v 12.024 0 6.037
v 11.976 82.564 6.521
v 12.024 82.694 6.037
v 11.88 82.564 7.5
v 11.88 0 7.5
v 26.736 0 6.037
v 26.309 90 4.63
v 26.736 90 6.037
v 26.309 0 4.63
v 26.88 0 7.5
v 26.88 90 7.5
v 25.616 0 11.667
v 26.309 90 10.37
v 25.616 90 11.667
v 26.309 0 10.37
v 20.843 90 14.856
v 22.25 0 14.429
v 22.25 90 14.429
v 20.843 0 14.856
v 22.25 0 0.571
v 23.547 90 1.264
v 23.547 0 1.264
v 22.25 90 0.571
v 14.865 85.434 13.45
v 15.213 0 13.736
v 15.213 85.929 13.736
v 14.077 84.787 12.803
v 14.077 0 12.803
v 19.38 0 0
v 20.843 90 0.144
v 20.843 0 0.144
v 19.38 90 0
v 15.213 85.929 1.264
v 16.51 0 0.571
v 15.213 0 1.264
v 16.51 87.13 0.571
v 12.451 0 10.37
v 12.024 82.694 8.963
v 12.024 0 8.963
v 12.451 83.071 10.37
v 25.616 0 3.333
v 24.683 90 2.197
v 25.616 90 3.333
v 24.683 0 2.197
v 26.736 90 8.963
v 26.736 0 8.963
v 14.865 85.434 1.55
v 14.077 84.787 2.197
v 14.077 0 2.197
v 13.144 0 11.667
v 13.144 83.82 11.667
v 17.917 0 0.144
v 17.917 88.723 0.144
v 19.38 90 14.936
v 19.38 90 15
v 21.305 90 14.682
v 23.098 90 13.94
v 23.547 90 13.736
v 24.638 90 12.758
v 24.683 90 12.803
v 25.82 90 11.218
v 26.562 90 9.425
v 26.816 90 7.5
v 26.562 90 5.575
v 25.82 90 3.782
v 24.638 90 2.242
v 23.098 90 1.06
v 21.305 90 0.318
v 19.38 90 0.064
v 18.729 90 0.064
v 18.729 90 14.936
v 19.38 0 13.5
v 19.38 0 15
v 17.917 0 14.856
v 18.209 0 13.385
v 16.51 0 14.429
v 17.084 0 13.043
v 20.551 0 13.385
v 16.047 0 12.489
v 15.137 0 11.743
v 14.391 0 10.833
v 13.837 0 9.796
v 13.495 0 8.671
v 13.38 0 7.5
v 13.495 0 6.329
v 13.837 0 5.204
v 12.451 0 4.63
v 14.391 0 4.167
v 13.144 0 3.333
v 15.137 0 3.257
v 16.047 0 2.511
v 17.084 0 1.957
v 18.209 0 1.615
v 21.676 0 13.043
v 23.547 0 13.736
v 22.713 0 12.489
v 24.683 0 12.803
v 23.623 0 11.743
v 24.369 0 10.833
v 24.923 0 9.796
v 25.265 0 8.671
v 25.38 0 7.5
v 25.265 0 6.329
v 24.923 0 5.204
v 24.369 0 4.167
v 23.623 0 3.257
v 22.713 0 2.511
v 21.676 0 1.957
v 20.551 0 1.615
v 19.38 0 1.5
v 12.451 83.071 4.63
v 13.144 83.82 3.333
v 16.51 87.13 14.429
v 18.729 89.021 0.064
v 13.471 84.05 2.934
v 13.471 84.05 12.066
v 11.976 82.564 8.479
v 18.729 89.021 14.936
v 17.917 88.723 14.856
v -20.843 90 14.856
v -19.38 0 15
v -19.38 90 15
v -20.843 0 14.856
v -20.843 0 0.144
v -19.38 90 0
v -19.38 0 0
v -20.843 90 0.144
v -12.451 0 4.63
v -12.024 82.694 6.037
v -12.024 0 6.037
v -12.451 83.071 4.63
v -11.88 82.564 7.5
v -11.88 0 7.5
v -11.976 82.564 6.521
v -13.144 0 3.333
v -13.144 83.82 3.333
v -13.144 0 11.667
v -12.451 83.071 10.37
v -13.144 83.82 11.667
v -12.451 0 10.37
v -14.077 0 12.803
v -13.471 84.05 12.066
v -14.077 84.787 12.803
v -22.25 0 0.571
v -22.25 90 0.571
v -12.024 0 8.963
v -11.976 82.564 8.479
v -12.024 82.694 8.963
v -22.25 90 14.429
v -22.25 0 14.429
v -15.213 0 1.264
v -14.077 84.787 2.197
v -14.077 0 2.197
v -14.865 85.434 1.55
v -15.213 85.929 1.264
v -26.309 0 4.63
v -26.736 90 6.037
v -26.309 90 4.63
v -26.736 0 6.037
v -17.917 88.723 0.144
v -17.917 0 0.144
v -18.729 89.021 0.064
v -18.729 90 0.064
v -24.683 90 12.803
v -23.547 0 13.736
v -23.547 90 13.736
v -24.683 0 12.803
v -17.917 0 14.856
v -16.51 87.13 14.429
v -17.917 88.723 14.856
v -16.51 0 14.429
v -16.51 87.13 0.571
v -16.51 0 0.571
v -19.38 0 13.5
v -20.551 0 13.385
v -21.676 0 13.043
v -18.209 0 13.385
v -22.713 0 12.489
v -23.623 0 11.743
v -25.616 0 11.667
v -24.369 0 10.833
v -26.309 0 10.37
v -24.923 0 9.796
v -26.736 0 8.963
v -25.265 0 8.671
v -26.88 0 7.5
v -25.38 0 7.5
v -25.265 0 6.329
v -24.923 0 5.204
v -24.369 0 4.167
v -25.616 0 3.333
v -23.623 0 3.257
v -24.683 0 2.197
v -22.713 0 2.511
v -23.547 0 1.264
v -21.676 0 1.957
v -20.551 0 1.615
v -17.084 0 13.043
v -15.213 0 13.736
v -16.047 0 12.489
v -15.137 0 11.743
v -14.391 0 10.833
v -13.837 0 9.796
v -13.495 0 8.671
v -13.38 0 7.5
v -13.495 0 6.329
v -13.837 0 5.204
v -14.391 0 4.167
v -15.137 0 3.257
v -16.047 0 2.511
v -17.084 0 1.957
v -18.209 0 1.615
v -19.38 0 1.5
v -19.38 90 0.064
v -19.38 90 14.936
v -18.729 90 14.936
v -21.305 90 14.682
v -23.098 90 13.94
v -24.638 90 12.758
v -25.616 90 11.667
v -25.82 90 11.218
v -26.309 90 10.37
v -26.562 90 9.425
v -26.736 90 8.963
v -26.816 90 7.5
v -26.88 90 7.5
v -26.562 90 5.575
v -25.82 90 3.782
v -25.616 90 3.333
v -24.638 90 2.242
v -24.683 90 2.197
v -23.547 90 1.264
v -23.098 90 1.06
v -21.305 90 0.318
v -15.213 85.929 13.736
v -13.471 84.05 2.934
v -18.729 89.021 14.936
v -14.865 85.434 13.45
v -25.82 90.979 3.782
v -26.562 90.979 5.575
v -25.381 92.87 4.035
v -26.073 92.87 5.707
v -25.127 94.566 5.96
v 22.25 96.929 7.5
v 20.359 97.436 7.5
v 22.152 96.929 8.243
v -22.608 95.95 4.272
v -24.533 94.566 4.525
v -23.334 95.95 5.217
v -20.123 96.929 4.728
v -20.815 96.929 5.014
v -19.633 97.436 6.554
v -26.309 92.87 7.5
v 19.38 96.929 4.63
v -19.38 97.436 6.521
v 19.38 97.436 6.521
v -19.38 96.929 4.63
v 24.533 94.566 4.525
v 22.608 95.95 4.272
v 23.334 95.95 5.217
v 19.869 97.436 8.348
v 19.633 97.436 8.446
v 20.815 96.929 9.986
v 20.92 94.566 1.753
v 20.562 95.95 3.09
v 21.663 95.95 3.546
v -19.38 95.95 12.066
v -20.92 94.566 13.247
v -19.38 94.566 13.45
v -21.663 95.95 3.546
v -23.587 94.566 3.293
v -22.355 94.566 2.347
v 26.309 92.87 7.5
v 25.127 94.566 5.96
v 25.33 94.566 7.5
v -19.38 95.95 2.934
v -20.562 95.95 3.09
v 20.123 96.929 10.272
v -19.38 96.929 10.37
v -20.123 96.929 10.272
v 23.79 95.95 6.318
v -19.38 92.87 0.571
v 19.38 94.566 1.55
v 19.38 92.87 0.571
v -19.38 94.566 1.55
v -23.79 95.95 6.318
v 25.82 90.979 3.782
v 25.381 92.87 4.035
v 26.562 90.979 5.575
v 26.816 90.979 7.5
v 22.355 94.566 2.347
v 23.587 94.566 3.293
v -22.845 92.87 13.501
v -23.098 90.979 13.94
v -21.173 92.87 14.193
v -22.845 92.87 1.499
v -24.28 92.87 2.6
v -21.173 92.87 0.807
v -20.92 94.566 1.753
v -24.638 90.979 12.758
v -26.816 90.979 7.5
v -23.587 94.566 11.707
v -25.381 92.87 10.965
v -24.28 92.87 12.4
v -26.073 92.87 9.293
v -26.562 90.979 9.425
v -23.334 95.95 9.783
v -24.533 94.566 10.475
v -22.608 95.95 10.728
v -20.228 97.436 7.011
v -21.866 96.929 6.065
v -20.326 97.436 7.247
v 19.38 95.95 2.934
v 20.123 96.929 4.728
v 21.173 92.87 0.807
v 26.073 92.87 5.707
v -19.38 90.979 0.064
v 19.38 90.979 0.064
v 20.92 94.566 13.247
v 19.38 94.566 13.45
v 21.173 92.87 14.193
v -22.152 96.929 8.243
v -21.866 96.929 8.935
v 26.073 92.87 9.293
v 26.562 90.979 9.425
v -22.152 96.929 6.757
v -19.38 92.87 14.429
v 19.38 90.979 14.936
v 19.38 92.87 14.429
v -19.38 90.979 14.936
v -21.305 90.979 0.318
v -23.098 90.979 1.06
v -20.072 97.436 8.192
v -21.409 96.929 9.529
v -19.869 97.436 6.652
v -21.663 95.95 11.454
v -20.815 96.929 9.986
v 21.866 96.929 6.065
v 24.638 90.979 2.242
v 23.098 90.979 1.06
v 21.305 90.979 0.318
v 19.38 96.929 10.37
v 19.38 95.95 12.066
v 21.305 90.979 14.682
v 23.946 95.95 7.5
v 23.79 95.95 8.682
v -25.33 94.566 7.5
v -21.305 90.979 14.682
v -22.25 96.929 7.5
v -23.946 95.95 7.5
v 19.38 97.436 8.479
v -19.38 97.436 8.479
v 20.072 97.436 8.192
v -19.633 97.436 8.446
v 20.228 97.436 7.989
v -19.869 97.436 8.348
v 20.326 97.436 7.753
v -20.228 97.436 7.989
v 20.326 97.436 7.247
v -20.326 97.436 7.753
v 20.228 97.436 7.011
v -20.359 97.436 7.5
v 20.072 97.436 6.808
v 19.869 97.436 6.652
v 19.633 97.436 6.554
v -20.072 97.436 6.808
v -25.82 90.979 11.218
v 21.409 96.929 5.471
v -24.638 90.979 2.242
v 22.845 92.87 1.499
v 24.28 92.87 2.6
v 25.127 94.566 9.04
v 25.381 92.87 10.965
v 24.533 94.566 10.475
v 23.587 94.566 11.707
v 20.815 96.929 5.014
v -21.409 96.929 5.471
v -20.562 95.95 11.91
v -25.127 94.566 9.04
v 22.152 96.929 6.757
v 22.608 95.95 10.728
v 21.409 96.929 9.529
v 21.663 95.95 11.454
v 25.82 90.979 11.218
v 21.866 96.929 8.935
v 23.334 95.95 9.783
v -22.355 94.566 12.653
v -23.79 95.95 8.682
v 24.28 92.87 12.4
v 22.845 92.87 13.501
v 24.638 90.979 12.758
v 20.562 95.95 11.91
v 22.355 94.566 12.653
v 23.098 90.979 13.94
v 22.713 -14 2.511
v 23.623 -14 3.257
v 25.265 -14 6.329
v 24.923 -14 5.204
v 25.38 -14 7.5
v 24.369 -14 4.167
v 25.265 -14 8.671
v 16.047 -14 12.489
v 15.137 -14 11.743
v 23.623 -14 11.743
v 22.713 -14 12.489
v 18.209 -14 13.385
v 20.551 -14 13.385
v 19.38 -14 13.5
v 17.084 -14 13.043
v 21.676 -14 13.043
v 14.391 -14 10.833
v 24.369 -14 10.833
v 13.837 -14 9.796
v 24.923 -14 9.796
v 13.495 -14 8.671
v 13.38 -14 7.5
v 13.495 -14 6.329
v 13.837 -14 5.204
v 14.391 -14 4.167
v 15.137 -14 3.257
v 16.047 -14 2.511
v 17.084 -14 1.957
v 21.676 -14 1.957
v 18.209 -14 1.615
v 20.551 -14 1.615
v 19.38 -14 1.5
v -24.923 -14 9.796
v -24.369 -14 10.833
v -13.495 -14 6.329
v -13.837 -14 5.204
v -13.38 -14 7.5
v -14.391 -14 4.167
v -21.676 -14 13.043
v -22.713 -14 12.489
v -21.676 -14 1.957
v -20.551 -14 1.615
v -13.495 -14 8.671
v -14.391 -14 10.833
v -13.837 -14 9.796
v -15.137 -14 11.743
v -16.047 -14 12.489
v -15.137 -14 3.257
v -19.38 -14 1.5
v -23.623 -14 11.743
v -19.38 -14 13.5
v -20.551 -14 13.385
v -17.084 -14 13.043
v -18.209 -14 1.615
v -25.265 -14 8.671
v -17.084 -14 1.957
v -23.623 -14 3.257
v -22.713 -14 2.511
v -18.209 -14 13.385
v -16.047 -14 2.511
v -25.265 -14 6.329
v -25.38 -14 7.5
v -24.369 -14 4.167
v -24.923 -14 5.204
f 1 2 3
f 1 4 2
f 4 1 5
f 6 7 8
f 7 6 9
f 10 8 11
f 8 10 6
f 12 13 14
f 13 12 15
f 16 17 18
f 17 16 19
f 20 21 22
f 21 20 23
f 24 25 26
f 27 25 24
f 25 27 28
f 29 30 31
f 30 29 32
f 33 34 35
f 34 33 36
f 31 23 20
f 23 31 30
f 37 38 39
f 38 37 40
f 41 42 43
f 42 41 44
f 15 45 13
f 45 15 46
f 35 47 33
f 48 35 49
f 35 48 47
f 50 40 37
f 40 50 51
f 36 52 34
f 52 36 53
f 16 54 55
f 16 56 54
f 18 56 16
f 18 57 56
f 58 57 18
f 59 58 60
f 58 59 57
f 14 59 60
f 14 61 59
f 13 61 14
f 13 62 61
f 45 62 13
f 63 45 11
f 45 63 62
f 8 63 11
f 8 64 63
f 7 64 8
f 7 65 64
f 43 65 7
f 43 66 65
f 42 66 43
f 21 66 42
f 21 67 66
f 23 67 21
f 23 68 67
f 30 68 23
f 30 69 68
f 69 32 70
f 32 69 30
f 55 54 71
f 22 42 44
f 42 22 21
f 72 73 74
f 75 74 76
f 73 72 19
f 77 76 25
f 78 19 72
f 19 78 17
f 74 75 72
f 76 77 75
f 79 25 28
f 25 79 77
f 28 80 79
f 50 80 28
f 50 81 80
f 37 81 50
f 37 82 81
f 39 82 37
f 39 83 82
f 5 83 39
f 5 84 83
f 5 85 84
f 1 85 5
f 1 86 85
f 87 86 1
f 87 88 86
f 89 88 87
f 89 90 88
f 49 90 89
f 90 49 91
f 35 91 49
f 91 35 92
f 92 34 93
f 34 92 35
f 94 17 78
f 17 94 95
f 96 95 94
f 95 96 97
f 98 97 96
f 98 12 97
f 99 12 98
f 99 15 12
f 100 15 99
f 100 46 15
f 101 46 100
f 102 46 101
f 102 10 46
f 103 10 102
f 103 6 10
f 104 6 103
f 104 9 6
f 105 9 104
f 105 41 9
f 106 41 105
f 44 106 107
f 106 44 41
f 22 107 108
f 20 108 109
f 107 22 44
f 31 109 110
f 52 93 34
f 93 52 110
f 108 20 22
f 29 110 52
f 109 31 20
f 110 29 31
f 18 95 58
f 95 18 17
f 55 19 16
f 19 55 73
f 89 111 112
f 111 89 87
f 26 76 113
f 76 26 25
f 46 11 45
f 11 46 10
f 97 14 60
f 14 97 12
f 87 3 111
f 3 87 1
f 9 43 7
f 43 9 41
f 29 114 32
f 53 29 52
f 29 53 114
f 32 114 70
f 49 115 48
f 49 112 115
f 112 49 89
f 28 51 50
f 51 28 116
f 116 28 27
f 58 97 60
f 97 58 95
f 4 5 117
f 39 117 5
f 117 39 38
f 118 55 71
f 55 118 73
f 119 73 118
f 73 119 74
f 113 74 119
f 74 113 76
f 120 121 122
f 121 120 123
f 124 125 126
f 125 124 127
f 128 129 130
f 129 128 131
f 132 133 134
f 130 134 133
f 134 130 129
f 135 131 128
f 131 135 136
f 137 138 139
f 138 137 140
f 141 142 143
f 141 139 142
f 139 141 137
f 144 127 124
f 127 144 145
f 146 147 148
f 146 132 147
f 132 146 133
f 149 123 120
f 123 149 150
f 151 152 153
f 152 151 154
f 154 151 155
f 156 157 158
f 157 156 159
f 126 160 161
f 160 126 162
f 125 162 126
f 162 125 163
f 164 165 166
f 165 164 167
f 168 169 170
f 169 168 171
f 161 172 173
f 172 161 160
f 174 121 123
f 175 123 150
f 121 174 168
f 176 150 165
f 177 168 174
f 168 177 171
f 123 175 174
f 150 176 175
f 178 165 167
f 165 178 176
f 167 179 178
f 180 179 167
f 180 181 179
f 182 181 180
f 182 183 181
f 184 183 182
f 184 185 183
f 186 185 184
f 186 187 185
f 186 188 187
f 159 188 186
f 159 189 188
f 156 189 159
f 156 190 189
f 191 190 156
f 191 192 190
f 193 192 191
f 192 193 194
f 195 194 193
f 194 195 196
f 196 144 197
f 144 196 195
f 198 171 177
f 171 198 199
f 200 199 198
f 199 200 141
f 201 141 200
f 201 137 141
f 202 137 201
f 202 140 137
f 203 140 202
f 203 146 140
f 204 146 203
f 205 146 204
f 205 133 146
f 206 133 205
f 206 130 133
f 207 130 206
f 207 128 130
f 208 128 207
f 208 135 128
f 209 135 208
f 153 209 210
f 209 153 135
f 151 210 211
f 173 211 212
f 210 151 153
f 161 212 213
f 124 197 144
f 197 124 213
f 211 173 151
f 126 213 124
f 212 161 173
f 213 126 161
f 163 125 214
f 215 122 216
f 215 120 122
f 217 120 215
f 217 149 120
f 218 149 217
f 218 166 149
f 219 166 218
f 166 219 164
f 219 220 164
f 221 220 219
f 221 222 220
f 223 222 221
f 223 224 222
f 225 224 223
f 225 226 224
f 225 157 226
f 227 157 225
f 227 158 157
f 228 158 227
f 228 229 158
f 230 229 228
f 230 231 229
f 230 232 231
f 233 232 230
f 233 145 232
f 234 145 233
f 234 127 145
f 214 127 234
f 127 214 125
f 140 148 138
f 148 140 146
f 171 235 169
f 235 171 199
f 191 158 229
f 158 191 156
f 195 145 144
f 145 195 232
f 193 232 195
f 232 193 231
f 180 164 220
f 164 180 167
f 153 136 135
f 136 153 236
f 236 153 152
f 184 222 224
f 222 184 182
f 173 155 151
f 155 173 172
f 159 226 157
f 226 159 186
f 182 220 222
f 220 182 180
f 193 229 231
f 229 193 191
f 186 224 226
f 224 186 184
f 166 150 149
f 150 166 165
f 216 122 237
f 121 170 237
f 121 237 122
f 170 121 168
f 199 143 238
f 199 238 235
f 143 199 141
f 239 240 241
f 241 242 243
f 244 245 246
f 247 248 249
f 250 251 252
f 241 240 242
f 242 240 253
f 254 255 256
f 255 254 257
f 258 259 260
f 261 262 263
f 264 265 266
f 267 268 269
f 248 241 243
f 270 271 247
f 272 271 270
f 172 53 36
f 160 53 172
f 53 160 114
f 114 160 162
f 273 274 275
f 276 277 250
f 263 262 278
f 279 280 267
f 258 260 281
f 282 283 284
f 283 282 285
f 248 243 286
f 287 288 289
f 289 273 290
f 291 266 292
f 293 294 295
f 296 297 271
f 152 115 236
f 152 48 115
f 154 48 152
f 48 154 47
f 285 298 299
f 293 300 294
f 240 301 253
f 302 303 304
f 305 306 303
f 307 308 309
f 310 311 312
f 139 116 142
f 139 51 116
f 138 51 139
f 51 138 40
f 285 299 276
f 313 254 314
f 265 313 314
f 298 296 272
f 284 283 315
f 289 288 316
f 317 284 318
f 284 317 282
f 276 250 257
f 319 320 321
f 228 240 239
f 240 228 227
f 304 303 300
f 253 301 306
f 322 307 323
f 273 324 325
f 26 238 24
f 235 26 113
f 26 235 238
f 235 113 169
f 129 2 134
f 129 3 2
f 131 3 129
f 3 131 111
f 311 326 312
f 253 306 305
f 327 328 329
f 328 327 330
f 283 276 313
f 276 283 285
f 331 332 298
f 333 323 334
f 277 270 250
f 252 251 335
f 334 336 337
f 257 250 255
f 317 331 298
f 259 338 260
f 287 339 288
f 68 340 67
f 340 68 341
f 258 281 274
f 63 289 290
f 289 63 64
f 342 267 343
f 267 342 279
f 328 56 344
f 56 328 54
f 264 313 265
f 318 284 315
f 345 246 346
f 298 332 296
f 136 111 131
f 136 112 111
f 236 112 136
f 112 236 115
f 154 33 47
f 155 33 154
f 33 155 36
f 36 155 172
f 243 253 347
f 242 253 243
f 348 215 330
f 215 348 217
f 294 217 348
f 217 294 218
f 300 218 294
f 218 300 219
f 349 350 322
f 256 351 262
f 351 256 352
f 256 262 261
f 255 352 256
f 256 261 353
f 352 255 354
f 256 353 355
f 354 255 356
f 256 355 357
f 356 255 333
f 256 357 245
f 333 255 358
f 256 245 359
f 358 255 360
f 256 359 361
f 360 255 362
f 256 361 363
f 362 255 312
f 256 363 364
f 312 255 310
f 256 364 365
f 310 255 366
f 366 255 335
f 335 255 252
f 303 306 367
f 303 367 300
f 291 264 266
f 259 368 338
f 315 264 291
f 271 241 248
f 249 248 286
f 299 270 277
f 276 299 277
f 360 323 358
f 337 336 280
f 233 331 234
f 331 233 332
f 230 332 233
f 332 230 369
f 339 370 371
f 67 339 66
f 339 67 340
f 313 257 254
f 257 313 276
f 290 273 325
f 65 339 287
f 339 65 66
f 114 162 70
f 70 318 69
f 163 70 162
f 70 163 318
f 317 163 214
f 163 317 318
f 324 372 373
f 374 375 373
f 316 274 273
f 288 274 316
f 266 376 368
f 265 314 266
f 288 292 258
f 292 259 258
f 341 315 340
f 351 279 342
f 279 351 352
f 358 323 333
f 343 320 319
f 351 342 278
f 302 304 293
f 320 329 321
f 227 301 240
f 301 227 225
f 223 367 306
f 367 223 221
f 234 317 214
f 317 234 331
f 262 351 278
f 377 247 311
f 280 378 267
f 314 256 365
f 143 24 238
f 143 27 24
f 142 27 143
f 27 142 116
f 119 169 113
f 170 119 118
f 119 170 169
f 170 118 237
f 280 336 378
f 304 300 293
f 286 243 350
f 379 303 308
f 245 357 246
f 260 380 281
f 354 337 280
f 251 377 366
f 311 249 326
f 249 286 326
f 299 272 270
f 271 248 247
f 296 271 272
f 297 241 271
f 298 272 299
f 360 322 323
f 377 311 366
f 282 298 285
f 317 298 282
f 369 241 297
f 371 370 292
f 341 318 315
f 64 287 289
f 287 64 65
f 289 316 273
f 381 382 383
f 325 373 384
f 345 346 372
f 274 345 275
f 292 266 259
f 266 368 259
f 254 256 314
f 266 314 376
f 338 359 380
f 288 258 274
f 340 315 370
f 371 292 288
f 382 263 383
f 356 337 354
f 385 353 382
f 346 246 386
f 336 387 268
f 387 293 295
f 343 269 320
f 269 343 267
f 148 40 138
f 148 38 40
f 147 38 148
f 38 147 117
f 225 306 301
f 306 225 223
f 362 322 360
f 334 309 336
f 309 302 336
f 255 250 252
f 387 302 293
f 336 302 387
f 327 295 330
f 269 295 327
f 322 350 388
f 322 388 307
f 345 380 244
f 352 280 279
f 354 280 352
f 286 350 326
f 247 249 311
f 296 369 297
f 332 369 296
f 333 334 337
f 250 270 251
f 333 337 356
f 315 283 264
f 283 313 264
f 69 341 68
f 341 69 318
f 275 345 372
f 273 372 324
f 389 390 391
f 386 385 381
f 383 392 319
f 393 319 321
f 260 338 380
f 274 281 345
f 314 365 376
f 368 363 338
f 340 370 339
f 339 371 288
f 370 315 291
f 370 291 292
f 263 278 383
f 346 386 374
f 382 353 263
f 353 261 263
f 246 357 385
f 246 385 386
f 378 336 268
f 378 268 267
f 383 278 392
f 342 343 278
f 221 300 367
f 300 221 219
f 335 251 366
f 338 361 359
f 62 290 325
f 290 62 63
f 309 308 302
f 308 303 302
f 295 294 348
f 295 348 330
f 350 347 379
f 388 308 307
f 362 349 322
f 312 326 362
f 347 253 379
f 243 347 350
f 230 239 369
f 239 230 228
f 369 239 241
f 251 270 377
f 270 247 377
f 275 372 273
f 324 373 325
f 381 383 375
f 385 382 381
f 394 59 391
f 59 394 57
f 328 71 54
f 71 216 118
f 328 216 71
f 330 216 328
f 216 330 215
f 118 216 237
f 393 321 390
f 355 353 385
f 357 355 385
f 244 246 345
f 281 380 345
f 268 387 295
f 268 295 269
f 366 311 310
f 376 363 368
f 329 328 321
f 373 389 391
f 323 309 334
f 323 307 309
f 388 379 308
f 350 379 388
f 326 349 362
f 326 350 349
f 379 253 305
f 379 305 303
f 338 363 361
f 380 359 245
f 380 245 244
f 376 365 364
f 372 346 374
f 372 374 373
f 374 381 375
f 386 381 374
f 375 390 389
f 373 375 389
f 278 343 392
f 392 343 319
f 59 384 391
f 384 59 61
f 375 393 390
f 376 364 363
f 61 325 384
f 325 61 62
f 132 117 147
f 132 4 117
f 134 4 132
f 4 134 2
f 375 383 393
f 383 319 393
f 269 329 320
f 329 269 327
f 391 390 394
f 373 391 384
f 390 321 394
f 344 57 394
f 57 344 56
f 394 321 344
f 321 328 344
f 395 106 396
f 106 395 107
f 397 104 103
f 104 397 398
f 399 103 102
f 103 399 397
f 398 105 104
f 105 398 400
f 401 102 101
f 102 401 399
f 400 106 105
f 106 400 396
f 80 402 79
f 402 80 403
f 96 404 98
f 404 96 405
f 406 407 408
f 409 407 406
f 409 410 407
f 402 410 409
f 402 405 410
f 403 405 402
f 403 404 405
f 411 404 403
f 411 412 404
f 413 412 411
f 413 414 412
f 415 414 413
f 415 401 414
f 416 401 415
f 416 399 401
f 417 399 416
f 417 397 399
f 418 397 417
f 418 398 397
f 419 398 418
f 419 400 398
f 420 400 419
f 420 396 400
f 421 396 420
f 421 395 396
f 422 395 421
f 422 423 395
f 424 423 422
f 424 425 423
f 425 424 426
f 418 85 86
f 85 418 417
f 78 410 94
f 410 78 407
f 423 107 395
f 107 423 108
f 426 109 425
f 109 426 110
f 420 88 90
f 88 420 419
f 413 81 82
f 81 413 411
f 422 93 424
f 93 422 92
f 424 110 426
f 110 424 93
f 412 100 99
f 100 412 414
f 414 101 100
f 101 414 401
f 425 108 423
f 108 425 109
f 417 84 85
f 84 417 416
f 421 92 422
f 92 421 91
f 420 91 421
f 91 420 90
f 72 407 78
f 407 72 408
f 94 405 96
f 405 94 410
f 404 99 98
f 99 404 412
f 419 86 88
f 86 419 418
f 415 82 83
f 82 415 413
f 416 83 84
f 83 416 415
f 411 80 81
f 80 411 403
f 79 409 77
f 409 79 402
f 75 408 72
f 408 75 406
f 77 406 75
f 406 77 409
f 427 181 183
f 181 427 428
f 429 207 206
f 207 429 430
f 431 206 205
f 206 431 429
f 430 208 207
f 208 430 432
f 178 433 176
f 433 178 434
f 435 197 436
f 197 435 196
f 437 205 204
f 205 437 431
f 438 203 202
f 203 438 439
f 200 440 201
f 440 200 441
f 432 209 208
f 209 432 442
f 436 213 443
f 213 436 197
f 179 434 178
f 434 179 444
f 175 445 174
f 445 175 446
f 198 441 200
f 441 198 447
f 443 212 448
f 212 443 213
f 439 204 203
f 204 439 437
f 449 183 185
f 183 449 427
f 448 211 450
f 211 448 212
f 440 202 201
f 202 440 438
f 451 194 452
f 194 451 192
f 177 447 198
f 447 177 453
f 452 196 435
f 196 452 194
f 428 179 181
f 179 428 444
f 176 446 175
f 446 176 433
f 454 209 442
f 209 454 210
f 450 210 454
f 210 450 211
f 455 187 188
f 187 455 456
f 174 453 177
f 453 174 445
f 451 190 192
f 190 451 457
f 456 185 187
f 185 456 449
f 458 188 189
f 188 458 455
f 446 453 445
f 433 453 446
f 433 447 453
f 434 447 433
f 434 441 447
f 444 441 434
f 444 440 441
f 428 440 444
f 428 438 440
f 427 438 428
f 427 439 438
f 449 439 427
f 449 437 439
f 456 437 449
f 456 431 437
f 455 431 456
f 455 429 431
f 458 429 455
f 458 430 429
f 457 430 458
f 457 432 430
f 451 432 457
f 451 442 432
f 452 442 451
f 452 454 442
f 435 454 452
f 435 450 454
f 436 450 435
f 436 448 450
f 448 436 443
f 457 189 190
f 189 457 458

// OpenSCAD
/**********************************************************************
  Spice Rack Conveyor - BAMBU P1S "SEPARATE PLATE" EDITION
  - FIX: Use this mode to get smooth bottom surfaces.
  - INSTRUCTIONS: 
      1. Set part_to_print = "base", Render (F6), Export STL (F7).
      2. Set part_to_print = "chain", Render (F6), Export STL (F7).
      3. Print separately and drop the chain into the base.
**********************************************************************/

/* [Configuration] */
bottle_diameter = 53;
num_bottles = 8;

/* [View Settings] */
// CHANGE THIS to export your files one by one:
// "base"   -> The red track housing
// "chain"  -> The loop of links (Prints flat on bed)
// "handle" -> The central spinner
part_to_print = "handle";

/* [Dimensions] */
rail_height = 16;            
wall_height = 20;
floor_thickness = 3;
handle_height = 90;
handle_thickness = 15;
sliding_clearance = 1.5;

/* [Animation Controls] */
show_bottles = false;
freeze_for_print = true;     
print_phase = 0;             

/* [Tuning - Pintle Hitch] */
jaw_thickness = 2.8;         
z_gap = 0.35;                
arm_width = 8.0;             

/* [Test Coupon] */
coupon_gap = 6;              

/* --- HINGE SETTINGS --- */
hinge_shank_d   = 5.0;       
hinge_head_d    = 8.6;
hinge_lug_d     = 9.0;      
hinge_clear     = 0.6;       

/* --- CALCULATIONS --- */
ring_wall_thick = 1.2;
ring_outer_dia  = bottle_diameter + (ring_wall_thick*2);

// Link Gap
link_gap = hinge_lug_d + 0.2; 
link_len = ring_outer_dia + link_gap;

ef_relief_h     = 0.6;

/* --- Track layout --- */
bottles_on_curve = 3;
bottles_on_straight = floor((num_bottles - (bottles_on_curve*2)) / 2);

/* IMPORTANT GEOMETRY */
turn_delta  = 180 / bottles_on_curve;
turn_radius = link_len / (2 * sin(turn_delta/2));

straight_len = bottles_on_straight * link_len;

/* Base sizing */
chord_dist_to_center = turn_radius * cos(turn_delta/2);
island_radius = chord_dist_to_center - (ring_outer_dia/2) - sliding_clearance;
track_width   = island_radius * 2;
wall_radius   = turn_radius + (ring_outer_dia/2) + 0.5;
outer_width   = wall_radius * 2;

track_len = straight_len;
handle_spacing = straight_len * 0.6;

/* --- HELPERS --- */
function wrap(i, m) = i - floor(i/m) * m;
function vadd(a,b) = [a[0]+b[0], a[1]+b[1]];
function vmul(a,s) = [a[0]*s, a[1]*s];
function vavg(a,b) = vmul(vadd(a,b), 0.5);

/* --- LINK MODULE (PINTLE STYLE) --- */
module ring_link() {
    
    z_jaw_bot_start = 0;
    z_jaw_bot_end   = jaw_thickness;
    z_lunette_start = z_jaw_bot_end + z_gap;
    z_lunette_end   = rail_height - jaw_thickness - z_gap;
    z_lunette_h     = z_lunette_end - z_lunette_start;
    z_jaw_top_start = rail_height - jaw_thickness;
    z_jaw_top_end   = rail_height;

    chamfer_h = 0.8;

    difference() {
        // POSITIVE GEOMETRY
        union() {
            // 1. MAIN BODY (Ring)
            union() {
                cylinder(h=chamfer_h, d1=ring_outer_dia - 1.2, d2=ring_outer_dia, $fn=64);
                translate([0,0,chamfer_h])
                    cylinder(h=rail_height-chamfer_h, d=ring_outer_dia, $fn=64);
            }

            // 2. MALE LUNETTE (Right Side)
            intersection() {
                translate([0,0,z_lunette_start])
                    cylinder(h=z_lunette_h, d=500); 
                union() {
                    translate([link_len/2, 0, 0])
                        cylinder(h=rail_height, d=hinge_lug_d, $fn=48);
                    
                    hull() {
                        translate([ring_outer_dia/2 - 1, 0, 0])
                            cylinder(h=rail_height, d=arm_width, $fn=32);
                        translate([link_len/2, 0, 0])
                            cylinder(h=rail_height, d=hinge_lug_d, $fn=48);
                    }
                }
            }
            
            // 3. FEMALE JAWS (Left Side)
            intersection() {
                union() {
                    translate([0,0,z_jaw_bot_start]) cylinder(h=jaw_thickness, d=500);
                    translate([0,0,z_jaw_top_start]) cylinder(h=jaw_thickness, d=500);
                }
                union() {
                    translate([-link_len/2, 0, 0])
                        cylinder(h=rail_height, d=hinge_lug_d, $fn=48);
                    
                    hull() {
                        translate([-ring_outer_dia/2 + 1, 0, 0])
                            cylinder(h=rail_height, d=arm_width, $fn=32);
                        translate([-link_len/2, 0, 0])
                            cylinder(h=rail_height, d=hinge_lug_d, $fn=48);
                    }
                }
            }
            
            // 4. PIN
            translate([-link_len/2, 0, 0])
                cylinder(h=rail_height, d=hinge_shank_d, $fn=32);
        }

        // --- SUBTRACTIONS ---

        // 1. BOTTLE HOLE
        translate([0,0,-1]) 
            cylinder(h=rail_height+2, d=bottle_diameter, $fn=64);

        // 2. Pin Hole
        translate([link_len/2, 0, -1])
            cylinder(h=rail_height+2, d=hinge_shank_d + 2*hinge_clear, $fn=32);

        // 3. Elephant Foot Relief
        translate([-link_len/2, 0, -0.01])
             cylinder(h=ef_relief_h, d1=hinge_shank_d + 1.0, d2=hinge_shank_d, $fn=32);
        
        // 4. Internal Chamfers
        translate([link_len/2, 0, z_lunette_start])
             cylinder(h=0.6, d1=hinge_shank_d + 2*hinge_clear + 1.2, d2=hinge_shank_d + 2*hinge_clear, $fn=32);
        translate([link_len/2, 0, z_lunette_end - 0.6])
             cylinder(h=0.6, d1=hinge_shank_d + 2*hinge_clear, d2=hinge_shank_d + 2*hinge_clear + 1.2, $fn=32);
    }
}

/* --- JOINT LOOP GENERATION --- */
right_center = [ straight_len/2, 0 ];
left_center  = [ -straight_len/2, 0 ];

j_top = [ for(i=[0:bottles_on_straight]) [ -straight_len/2 + i*link_len,  turn_radius ] ];
j_right = [
    for(i=[1:bottles_on_curve])
        let(a = 90 - i*turn_delta)
        [ right_center[0] + turn_radius*cos(a), right_center[1] + turn_radius*sin(a) ]
];
j_bottom = [ for(i=[1:bottles_on_straight]) [ straight_len/2 - i*link_len, -turn_radius ] ];
j_left = [
    for(i=[1:bottles_on_curve-1])
        let(a = 270 - i*turn_delta)
        [ left_center[0] + turn_radius*cos(a), left_center[1] + turn_radius*sin(a) ]
];

J = concat(j_top, j_right, j_bottom, j_left);

module chain_closed_loop(zoff=0) {
    anim_offset = freeze_for_print ? print_phase : $t;

    for (i=[0:num_bottles-1]) {
        idx_curr   = wrap(i, num_bottles);
        idx_next   = wrap(i+1, num_bottles);
        idx_next_2 = wrap(i+2, num_bottles);

        p0_start = J[idx_curr];
        p1_start = J[idx_next];
        p0_end   = J[idx_next];
        p1_end   = J[idx_next_2];

        p0 = p0_start + (p0_end - p0_start) * anim_offset;
        p1 = p1_start + (p1_end - p1_start) * anim_offset;

        c  = vavg(p0, p1);
        th = atan2(p1[1]-p0[1], p1[0]-p0[0]);

        translate([c[0], c[1], zoff])
            rotate([0,0,th])
                ring_link();
    }
}

/* --- PARTS --- */
module full_base() {
    union() {
        difference() {
            hull() {
                translate([track_len/2, 0, floor_thickness]) cylinder(h=rail_height, d=track_width, $fn=64);
                translate([-track_len/2, 0, floor_thickness]) cylinder(h=rail_height, d=track_width, $fn=64);
            }
            translate([handle_spacing/2, 0, 0]) cylinder(h=rail_height+10, d=12.5, $fn=32);
            translate([-handle_spacing/2, 0, 0]) cylinder(h=rail_height+10, d=12.5, $fn=32);
        }
        
        shell_offset = 1.5;
        
        difference() {
            hull() {
                translate([track_len/2, 0, 0]) cylinder(h=wall_height, d=outer_width + shell_offset, $fn=64);
                translate([-track_len/2, 0, 0]) cylinder(h=wall_height, d=outer_width + shell_offset, $fn=64);
            }
            translate([0,0,floor_thickness])
            hull() {
                translate([track_len/2, 0, 0]) cylinder(h=wall_height+1, d=outer_width, $fn=64);
                translate([-track_len/2, 0, 0]) cylinder(h=wall_height+1, d=outer_width, $fn=64);
            }
        }
    }
}

module handle() {
    union() {
        translate([handle_spacing/2, 0, 0]) cylinder(h=handle_height, d=handle_thickness, $fn=32);
        translate([-handle_spacing/2, 0, 0]) cylinder(h=handle_height, d=handle_thickness, $fn=32);
        translate([0,0,handle_height])
        hull() {
             translate([handle_spacing/2, 0, 0]) sphere(d=handle_thickness);
             translate([-handle_spacing/2, 0, 0]) sphere(d=handle_thickness);
        }
        translate([handle_spacing/2, 0, -rail_height + 2]) cylinder(h=rail_height, d=12, $fn=32);
        translate([-handle_spacing/2, 0, -rail_height + 2]) cylinder(h=rail_height, d=12, $fn=32);
    }
}

/* --- OUTPUT LOGIC --- */
if (part_to_print == "base") {
    color("IndianRed") full_base();
}
else if (part_to_print == "chain") {
    color("White") chain_closed_loop(0);
}
else if (part_to_print == "handle") {
    translate([0, 0, handle_thickness/2])
        rotate([-90, 0, 0])
            handle();
}
else if (part_to_print == "assembly") {
    color("IndianRed") full_base();
    color("White") chain_closed_loop(floor_thickness + 0.5);
    color("Silver") translate([0,0, floor_thickness + rail_height]) handle();
}
else if (part_to_print == "print_in_place") {
    color("IndianRed") full_base();
    color("White") chain_closed_loop(floor_thickness + 0.25);
}
